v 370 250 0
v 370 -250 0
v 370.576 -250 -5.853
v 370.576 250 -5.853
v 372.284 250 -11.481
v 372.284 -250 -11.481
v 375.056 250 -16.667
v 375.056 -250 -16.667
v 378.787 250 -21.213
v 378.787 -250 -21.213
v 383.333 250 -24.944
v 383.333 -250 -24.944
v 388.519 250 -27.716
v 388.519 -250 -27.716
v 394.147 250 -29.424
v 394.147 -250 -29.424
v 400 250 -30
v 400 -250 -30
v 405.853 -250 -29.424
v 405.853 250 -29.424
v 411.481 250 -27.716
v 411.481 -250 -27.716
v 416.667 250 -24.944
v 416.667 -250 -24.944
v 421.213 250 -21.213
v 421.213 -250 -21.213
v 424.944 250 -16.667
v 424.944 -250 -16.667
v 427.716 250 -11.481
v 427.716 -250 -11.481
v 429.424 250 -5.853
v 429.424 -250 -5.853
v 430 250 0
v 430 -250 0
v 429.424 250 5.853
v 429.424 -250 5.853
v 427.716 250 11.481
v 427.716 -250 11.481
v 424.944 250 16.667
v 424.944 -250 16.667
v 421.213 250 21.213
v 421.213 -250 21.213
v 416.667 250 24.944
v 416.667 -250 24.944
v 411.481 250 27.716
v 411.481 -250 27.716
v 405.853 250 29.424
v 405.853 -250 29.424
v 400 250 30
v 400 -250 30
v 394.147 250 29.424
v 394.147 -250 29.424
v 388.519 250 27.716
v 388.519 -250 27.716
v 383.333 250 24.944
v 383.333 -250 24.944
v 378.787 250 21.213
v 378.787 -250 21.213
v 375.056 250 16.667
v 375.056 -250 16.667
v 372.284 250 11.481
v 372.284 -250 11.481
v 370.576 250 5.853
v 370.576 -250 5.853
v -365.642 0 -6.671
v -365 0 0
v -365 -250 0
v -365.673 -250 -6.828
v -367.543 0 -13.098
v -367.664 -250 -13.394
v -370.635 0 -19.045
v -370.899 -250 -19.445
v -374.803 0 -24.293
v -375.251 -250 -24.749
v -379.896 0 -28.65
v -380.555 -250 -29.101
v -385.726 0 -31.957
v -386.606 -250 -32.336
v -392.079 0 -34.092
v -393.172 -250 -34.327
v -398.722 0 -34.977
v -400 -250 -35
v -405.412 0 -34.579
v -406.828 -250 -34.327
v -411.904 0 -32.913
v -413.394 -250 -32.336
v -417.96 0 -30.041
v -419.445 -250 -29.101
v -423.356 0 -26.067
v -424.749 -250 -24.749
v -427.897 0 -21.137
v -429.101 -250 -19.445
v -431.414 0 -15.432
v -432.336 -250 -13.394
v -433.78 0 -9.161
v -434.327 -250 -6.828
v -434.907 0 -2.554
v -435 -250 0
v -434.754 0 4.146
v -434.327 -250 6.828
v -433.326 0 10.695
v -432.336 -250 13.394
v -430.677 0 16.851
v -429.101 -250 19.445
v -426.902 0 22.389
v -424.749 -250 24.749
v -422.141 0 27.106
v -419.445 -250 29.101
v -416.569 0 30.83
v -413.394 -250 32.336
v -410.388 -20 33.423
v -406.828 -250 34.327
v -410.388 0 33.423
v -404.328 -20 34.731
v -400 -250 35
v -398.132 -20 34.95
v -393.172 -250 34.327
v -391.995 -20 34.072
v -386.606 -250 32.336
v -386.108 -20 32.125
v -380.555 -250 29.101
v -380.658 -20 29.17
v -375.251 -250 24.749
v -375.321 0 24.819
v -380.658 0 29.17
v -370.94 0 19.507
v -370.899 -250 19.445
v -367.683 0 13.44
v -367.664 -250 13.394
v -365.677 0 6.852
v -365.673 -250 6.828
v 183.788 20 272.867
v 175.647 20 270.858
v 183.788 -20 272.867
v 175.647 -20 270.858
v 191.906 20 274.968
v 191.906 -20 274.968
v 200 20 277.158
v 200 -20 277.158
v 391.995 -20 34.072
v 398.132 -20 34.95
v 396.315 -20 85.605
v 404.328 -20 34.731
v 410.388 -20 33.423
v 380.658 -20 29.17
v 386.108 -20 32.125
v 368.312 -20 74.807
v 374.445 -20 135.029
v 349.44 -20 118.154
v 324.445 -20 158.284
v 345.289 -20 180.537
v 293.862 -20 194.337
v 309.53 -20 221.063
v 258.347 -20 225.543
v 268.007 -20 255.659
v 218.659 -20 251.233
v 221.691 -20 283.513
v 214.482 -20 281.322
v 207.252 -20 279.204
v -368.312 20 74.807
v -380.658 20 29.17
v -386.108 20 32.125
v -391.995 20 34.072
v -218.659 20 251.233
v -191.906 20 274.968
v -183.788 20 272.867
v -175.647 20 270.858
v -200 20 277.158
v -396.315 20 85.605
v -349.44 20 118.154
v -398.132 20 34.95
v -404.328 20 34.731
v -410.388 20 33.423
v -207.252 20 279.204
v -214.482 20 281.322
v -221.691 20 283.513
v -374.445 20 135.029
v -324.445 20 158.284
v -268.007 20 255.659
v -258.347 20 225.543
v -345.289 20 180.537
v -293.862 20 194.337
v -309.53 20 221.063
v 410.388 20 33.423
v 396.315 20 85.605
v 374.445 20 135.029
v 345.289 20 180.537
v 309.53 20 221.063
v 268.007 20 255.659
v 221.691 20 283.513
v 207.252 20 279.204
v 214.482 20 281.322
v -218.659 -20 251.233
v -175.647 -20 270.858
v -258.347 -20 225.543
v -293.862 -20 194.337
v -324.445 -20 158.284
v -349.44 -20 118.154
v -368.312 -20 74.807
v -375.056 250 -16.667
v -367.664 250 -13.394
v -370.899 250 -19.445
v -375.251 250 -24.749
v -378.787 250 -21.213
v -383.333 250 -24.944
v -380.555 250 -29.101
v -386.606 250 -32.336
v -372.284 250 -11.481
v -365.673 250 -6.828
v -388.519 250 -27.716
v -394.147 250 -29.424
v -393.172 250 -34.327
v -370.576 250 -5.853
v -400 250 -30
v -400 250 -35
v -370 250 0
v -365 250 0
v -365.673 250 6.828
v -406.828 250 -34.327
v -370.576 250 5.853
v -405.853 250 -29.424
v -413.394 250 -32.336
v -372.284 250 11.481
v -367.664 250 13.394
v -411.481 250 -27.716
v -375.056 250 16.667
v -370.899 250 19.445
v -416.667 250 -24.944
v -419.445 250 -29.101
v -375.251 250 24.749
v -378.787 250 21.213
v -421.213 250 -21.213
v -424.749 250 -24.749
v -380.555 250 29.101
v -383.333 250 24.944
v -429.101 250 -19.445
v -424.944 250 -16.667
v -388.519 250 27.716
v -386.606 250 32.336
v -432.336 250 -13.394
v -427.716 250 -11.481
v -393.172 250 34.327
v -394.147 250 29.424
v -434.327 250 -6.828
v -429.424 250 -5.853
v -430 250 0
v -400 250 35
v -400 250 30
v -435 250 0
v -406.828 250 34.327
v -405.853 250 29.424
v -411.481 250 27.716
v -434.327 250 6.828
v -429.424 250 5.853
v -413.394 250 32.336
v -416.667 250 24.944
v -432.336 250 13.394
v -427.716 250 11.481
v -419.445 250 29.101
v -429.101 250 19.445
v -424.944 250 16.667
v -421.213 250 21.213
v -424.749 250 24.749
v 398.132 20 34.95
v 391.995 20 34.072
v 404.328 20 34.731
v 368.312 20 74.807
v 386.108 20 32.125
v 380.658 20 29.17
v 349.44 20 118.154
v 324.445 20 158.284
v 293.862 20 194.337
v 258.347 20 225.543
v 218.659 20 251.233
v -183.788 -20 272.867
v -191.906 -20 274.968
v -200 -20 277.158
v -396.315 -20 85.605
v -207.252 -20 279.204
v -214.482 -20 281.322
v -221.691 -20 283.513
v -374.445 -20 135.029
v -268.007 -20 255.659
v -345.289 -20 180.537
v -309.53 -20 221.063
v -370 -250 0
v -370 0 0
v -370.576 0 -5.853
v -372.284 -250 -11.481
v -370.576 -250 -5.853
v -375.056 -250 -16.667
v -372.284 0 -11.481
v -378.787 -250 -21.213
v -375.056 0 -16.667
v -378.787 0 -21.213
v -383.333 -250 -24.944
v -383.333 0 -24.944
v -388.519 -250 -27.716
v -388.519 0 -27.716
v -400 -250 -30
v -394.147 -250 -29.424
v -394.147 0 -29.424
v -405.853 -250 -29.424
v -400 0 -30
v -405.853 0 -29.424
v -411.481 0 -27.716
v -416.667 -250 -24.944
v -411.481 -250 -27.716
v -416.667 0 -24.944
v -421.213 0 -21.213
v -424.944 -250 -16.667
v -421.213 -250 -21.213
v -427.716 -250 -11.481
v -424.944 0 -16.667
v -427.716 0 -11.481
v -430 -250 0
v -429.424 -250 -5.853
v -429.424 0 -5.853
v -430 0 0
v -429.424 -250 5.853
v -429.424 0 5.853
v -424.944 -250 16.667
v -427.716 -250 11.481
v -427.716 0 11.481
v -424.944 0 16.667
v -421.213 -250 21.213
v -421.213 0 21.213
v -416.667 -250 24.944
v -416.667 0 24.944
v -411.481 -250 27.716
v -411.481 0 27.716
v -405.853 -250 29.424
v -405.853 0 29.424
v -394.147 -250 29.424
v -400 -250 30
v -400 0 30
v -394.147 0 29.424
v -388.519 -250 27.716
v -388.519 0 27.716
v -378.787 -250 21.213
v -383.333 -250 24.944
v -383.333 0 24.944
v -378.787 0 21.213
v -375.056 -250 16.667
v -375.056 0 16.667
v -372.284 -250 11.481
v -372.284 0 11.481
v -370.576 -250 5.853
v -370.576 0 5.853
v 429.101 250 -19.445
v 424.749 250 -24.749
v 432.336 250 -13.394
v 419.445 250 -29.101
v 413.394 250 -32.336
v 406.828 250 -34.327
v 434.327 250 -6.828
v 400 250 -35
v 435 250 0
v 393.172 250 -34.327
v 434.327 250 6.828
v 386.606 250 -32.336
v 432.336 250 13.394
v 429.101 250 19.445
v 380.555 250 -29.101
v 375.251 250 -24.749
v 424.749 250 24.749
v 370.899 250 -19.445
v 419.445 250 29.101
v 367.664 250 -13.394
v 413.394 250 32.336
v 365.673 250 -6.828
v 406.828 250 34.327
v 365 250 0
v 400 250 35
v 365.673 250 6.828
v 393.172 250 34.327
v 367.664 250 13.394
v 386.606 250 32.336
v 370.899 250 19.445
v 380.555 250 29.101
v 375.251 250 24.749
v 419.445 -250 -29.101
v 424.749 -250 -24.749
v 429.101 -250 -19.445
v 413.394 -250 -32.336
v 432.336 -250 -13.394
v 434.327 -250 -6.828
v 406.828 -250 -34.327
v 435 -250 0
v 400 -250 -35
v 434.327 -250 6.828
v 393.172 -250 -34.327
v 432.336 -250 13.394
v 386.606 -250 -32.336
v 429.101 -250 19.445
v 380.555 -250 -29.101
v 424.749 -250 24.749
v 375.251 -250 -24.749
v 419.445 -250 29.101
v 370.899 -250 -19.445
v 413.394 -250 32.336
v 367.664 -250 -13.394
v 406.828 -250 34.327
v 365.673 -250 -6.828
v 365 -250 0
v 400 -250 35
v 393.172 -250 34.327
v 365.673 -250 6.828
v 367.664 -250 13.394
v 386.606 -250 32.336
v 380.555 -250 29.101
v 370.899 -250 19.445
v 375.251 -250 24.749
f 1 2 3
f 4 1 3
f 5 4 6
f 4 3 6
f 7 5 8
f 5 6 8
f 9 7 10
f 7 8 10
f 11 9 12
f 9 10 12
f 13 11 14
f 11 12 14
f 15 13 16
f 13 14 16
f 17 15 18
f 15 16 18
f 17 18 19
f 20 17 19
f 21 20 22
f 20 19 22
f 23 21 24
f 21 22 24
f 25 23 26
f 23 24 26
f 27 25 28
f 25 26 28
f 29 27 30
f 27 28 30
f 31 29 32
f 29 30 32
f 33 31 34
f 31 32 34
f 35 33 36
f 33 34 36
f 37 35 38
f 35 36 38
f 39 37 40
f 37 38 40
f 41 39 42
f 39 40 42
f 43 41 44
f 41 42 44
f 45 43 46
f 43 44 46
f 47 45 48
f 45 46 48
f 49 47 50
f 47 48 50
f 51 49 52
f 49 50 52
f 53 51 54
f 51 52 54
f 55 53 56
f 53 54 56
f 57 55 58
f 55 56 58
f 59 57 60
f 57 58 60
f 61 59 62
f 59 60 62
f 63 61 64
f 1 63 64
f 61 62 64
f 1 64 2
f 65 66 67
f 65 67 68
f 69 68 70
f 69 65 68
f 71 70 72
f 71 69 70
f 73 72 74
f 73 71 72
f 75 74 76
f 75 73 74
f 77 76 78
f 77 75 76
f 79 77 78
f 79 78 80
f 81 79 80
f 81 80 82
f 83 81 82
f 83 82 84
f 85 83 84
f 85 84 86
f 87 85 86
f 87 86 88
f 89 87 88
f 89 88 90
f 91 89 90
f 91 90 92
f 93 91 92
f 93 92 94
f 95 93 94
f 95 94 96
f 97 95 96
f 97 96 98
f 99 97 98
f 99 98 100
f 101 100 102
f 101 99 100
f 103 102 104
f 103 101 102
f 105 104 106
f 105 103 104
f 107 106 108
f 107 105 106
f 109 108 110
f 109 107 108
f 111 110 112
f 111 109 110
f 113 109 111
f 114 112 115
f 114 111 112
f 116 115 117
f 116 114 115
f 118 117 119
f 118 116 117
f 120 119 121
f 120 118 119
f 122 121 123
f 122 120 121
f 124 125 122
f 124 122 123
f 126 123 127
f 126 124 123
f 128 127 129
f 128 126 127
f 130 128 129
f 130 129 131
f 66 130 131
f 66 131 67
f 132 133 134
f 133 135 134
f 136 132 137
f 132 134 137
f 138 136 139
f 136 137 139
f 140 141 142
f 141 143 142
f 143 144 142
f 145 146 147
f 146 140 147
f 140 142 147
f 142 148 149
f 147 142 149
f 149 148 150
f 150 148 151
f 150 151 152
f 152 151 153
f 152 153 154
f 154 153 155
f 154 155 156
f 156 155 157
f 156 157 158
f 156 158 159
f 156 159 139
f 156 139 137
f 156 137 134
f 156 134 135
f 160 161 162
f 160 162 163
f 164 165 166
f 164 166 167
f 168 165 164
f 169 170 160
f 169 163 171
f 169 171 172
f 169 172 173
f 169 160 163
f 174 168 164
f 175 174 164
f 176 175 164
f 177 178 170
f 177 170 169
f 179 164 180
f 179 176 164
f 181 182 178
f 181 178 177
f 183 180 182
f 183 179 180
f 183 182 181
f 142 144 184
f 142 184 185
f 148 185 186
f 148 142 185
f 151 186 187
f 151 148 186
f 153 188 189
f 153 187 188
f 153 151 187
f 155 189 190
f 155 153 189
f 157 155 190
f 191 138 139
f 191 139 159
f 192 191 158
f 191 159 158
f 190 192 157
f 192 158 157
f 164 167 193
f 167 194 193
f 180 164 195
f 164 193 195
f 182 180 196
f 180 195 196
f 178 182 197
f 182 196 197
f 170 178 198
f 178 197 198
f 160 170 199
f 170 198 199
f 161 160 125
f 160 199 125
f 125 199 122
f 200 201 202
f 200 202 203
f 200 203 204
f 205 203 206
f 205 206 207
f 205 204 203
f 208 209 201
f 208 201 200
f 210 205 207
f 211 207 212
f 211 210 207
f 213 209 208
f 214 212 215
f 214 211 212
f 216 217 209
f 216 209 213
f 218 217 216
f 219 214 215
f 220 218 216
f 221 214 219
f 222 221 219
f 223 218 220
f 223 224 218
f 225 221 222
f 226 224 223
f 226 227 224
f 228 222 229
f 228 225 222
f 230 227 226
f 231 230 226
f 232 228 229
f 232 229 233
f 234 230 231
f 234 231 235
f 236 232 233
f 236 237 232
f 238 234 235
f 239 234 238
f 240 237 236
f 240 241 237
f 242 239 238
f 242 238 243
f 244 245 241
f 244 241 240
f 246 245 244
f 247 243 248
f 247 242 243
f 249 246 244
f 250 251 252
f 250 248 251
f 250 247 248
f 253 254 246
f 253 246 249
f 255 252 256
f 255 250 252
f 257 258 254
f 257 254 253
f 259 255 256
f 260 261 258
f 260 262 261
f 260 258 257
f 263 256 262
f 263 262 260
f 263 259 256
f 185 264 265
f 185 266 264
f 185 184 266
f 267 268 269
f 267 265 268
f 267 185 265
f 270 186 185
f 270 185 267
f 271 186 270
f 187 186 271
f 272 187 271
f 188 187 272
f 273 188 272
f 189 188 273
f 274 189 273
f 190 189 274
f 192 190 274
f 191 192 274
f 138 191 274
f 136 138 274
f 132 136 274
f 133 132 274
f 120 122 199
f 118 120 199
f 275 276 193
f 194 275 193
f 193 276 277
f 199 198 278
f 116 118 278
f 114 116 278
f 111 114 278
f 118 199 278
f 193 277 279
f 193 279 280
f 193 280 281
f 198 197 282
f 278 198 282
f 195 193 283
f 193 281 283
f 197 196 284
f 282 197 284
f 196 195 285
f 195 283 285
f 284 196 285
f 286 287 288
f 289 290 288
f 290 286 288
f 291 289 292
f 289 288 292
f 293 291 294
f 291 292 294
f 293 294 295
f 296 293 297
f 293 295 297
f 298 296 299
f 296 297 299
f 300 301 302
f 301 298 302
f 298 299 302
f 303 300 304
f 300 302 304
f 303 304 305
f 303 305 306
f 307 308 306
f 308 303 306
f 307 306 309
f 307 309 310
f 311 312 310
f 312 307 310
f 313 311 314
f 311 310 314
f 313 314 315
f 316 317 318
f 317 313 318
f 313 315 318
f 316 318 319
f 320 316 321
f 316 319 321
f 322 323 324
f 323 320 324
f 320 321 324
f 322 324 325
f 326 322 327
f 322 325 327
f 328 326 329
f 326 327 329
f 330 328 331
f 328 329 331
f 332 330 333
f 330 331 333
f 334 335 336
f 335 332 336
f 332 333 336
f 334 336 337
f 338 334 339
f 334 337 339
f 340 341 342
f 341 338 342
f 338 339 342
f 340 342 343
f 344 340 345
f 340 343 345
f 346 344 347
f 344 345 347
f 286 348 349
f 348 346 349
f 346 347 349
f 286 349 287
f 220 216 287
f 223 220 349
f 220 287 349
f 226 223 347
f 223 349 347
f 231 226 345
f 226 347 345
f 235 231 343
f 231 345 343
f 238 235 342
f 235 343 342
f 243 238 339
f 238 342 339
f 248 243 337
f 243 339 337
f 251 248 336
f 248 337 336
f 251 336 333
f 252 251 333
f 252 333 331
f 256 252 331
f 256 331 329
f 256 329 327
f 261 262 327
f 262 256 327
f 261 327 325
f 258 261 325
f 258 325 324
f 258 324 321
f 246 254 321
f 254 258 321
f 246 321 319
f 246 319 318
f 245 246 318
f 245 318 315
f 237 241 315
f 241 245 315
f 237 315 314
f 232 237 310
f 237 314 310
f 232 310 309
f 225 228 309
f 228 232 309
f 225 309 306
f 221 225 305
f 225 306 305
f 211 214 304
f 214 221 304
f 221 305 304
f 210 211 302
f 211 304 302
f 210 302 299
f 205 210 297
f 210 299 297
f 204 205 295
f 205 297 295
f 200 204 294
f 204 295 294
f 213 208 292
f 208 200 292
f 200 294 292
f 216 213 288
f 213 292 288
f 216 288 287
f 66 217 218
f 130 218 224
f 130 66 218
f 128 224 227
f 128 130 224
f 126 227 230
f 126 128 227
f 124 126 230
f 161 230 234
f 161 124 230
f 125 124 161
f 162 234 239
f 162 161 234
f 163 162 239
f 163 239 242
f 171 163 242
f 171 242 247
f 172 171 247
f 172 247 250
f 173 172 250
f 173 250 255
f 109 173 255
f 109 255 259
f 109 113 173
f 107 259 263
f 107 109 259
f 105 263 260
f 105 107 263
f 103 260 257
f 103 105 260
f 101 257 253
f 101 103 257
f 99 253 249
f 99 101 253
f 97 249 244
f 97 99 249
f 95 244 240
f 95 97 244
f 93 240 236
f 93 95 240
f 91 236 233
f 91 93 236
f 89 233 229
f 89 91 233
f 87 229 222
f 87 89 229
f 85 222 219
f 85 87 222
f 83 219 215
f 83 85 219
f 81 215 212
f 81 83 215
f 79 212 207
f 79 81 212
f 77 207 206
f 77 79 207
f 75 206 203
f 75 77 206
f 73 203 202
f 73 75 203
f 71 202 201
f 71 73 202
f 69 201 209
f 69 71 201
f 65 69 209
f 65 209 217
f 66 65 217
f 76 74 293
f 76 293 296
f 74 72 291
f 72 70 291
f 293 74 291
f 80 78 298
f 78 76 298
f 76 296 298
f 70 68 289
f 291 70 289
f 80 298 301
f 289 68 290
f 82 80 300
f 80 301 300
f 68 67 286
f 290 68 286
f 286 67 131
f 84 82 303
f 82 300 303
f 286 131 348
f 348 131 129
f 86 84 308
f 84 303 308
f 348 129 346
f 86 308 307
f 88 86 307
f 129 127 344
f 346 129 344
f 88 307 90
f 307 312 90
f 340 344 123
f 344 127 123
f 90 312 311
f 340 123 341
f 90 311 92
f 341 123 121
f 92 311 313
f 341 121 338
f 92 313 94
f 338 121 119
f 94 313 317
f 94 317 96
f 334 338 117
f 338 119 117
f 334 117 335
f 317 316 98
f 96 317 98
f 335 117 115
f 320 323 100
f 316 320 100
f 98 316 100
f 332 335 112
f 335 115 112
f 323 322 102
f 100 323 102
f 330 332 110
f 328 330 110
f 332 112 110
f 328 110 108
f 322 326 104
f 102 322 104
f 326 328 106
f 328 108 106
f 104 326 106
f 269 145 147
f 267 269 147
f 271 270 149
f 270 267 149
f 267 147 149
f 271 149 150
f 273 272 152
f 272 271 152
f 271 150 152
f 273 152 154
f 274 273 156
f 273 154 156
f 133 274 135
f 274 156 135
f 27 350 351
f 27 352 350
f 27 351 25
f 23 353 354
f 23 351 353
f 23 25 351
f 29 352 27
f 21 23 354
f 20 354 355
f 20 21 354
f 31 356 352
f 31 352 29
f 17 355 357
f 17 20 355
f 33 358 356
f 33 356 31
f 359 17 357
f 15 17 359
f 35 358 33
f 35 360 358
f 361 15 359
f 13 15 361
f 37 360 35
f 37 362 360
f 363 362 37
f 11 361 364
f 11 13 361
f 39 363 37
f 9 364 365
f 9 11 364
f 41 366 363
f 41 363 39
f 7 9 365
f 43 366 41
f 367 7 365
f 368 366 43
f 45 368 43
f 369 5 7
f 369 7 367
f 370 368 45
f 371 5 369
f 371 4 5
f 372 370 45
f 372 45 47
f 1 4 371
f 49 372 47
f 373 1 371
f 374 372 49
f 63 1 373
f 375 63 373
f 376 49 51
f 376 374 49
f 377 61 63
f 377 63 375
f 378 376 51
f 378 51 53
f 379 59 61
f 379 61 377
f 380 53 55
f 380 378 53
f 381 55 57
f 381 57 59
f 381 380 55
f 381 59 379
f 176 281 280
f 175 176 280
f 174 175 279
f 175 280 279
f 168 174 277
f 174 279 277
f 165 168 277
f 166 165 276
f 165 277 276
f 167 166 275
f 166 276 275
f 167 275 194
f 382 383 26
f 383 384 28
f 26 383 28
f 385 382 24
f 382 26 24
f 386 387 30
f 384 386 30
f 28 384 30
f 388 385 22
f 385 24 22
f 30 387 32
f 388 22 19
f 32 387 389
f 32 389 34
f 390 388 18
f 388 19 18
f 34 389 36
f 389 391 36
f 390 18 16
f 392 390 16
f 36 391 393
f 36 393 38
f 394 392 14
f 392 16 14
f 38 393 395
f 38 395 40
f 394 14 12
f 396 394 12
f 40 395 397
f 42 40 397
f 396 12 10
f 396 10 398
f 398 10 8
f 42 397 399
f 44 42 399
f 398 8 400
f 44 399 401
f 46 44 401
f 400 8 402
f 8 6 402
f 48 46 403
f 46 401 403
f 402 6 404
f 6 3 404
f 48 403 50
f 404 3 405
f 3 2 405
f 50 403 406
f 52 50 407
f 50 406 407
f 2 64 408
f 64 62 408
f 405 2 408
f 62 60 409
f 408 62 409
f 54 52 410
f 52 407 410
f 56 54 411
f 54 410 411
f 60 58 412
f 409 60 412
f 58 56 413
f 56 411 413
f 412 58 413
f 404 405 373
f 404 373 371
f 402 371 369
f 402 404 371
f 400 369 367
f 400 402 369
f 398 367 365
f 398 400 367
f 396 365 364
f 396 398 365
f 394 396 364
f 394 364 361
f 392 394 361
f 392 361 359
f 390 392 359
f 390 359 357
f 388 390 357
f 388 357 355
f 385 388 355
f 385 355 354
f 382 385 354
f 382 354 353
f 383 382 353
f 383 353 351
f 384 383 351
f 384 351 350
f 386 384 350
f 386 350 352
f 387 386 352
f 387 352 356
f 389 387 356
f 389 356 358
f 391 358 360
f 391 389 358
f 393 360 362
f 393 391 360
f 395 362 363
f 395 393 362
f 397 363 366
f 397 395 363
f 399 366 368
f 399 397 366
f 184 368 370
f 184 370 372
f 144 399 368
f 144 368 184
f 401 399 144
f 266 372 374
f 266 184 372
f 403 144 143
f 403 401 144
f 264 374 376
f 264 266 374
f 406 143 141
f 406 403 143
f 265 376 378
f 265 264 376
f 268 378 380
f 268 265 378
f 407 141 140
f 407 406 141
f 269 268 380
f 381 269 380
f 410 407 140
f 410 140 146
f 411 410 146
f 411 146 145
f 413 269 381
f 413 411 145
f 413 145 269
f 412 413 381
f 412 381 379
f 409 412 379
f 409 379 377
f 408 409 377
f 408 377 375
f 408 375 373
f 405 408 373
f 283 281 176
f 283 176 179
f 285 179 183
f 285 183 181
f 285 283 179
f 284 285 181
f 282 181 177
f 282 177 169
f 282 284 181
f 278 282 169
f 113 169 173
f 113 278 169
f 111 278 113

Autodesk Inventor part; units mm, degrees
ref_plane "YZ Plane" through (0, 0, 0) normal (1, 0, 0) x (0, 1, 0)
ref_plane "XZ Plane" through (0, 0, 0) normal (0, 1, 0) x (-1, 0, 0)
ref_plane "XY Plane" through (0, 0, 0) normal (0, 0, 1) x (1, 0, 0)
sketch "스케치1" plane through (0, 0, 0) normal (0, 1, 0) x (-1, 0, 0)
  line L0 (0, 0) -> (-400, 0)
  circle A0 centre (-400, 0) radius 35
  circle A1 centre (-400, 0) radius 30
  line L1 (0, 0) -> (0, 250)
  arc A2 (-200, 277.1584) -> (-175.6469, 270.8579) centre (0, 1000) ccw
  line L2 (0, 0) -> (0, 300)
  arc A3 (-414.9319, 1.4273) -> (-385.0681, -1.4273) centre (-400, 0) ccw
  arc A4 (-175.6469, 270.8579) -> (-385.0681, -1.4273) centre (-63.367, -32.1773) ccw
  arc A5 (-221.6912, 283.5134) -> (-200, 277.1584) centre (0, 1000) ccw
  arc A6 (-221.6912, 283.5134) -> (-414.9319, 1.4273) centre (-63.367, -32.1773) ccw
  point P0 (-410.3883, 33.4228)
  point P1 (-380.6581, 29.17)
  dimension "d0" = 400
  dimension "d1" = 70
  dimension "d2" = 60
  dimension "d3" = 250
  dimension "d6" = 300
extrude "돌출1" add sketch "스케치1" along normal mid plane 500 contours A0 A6 A1 L0 | L0 A1 A4 A0 | A4 A1 A6 A0
extrude "돌출2" add sketch "스케치1" along normal mid plane 40 contours A0 A6 A5 A2 A4
mirror "미러1" about plane through (0, 0, 0) normal (1, 0, 0) of "돌출1", "돌출2"
properties part number "stand"
